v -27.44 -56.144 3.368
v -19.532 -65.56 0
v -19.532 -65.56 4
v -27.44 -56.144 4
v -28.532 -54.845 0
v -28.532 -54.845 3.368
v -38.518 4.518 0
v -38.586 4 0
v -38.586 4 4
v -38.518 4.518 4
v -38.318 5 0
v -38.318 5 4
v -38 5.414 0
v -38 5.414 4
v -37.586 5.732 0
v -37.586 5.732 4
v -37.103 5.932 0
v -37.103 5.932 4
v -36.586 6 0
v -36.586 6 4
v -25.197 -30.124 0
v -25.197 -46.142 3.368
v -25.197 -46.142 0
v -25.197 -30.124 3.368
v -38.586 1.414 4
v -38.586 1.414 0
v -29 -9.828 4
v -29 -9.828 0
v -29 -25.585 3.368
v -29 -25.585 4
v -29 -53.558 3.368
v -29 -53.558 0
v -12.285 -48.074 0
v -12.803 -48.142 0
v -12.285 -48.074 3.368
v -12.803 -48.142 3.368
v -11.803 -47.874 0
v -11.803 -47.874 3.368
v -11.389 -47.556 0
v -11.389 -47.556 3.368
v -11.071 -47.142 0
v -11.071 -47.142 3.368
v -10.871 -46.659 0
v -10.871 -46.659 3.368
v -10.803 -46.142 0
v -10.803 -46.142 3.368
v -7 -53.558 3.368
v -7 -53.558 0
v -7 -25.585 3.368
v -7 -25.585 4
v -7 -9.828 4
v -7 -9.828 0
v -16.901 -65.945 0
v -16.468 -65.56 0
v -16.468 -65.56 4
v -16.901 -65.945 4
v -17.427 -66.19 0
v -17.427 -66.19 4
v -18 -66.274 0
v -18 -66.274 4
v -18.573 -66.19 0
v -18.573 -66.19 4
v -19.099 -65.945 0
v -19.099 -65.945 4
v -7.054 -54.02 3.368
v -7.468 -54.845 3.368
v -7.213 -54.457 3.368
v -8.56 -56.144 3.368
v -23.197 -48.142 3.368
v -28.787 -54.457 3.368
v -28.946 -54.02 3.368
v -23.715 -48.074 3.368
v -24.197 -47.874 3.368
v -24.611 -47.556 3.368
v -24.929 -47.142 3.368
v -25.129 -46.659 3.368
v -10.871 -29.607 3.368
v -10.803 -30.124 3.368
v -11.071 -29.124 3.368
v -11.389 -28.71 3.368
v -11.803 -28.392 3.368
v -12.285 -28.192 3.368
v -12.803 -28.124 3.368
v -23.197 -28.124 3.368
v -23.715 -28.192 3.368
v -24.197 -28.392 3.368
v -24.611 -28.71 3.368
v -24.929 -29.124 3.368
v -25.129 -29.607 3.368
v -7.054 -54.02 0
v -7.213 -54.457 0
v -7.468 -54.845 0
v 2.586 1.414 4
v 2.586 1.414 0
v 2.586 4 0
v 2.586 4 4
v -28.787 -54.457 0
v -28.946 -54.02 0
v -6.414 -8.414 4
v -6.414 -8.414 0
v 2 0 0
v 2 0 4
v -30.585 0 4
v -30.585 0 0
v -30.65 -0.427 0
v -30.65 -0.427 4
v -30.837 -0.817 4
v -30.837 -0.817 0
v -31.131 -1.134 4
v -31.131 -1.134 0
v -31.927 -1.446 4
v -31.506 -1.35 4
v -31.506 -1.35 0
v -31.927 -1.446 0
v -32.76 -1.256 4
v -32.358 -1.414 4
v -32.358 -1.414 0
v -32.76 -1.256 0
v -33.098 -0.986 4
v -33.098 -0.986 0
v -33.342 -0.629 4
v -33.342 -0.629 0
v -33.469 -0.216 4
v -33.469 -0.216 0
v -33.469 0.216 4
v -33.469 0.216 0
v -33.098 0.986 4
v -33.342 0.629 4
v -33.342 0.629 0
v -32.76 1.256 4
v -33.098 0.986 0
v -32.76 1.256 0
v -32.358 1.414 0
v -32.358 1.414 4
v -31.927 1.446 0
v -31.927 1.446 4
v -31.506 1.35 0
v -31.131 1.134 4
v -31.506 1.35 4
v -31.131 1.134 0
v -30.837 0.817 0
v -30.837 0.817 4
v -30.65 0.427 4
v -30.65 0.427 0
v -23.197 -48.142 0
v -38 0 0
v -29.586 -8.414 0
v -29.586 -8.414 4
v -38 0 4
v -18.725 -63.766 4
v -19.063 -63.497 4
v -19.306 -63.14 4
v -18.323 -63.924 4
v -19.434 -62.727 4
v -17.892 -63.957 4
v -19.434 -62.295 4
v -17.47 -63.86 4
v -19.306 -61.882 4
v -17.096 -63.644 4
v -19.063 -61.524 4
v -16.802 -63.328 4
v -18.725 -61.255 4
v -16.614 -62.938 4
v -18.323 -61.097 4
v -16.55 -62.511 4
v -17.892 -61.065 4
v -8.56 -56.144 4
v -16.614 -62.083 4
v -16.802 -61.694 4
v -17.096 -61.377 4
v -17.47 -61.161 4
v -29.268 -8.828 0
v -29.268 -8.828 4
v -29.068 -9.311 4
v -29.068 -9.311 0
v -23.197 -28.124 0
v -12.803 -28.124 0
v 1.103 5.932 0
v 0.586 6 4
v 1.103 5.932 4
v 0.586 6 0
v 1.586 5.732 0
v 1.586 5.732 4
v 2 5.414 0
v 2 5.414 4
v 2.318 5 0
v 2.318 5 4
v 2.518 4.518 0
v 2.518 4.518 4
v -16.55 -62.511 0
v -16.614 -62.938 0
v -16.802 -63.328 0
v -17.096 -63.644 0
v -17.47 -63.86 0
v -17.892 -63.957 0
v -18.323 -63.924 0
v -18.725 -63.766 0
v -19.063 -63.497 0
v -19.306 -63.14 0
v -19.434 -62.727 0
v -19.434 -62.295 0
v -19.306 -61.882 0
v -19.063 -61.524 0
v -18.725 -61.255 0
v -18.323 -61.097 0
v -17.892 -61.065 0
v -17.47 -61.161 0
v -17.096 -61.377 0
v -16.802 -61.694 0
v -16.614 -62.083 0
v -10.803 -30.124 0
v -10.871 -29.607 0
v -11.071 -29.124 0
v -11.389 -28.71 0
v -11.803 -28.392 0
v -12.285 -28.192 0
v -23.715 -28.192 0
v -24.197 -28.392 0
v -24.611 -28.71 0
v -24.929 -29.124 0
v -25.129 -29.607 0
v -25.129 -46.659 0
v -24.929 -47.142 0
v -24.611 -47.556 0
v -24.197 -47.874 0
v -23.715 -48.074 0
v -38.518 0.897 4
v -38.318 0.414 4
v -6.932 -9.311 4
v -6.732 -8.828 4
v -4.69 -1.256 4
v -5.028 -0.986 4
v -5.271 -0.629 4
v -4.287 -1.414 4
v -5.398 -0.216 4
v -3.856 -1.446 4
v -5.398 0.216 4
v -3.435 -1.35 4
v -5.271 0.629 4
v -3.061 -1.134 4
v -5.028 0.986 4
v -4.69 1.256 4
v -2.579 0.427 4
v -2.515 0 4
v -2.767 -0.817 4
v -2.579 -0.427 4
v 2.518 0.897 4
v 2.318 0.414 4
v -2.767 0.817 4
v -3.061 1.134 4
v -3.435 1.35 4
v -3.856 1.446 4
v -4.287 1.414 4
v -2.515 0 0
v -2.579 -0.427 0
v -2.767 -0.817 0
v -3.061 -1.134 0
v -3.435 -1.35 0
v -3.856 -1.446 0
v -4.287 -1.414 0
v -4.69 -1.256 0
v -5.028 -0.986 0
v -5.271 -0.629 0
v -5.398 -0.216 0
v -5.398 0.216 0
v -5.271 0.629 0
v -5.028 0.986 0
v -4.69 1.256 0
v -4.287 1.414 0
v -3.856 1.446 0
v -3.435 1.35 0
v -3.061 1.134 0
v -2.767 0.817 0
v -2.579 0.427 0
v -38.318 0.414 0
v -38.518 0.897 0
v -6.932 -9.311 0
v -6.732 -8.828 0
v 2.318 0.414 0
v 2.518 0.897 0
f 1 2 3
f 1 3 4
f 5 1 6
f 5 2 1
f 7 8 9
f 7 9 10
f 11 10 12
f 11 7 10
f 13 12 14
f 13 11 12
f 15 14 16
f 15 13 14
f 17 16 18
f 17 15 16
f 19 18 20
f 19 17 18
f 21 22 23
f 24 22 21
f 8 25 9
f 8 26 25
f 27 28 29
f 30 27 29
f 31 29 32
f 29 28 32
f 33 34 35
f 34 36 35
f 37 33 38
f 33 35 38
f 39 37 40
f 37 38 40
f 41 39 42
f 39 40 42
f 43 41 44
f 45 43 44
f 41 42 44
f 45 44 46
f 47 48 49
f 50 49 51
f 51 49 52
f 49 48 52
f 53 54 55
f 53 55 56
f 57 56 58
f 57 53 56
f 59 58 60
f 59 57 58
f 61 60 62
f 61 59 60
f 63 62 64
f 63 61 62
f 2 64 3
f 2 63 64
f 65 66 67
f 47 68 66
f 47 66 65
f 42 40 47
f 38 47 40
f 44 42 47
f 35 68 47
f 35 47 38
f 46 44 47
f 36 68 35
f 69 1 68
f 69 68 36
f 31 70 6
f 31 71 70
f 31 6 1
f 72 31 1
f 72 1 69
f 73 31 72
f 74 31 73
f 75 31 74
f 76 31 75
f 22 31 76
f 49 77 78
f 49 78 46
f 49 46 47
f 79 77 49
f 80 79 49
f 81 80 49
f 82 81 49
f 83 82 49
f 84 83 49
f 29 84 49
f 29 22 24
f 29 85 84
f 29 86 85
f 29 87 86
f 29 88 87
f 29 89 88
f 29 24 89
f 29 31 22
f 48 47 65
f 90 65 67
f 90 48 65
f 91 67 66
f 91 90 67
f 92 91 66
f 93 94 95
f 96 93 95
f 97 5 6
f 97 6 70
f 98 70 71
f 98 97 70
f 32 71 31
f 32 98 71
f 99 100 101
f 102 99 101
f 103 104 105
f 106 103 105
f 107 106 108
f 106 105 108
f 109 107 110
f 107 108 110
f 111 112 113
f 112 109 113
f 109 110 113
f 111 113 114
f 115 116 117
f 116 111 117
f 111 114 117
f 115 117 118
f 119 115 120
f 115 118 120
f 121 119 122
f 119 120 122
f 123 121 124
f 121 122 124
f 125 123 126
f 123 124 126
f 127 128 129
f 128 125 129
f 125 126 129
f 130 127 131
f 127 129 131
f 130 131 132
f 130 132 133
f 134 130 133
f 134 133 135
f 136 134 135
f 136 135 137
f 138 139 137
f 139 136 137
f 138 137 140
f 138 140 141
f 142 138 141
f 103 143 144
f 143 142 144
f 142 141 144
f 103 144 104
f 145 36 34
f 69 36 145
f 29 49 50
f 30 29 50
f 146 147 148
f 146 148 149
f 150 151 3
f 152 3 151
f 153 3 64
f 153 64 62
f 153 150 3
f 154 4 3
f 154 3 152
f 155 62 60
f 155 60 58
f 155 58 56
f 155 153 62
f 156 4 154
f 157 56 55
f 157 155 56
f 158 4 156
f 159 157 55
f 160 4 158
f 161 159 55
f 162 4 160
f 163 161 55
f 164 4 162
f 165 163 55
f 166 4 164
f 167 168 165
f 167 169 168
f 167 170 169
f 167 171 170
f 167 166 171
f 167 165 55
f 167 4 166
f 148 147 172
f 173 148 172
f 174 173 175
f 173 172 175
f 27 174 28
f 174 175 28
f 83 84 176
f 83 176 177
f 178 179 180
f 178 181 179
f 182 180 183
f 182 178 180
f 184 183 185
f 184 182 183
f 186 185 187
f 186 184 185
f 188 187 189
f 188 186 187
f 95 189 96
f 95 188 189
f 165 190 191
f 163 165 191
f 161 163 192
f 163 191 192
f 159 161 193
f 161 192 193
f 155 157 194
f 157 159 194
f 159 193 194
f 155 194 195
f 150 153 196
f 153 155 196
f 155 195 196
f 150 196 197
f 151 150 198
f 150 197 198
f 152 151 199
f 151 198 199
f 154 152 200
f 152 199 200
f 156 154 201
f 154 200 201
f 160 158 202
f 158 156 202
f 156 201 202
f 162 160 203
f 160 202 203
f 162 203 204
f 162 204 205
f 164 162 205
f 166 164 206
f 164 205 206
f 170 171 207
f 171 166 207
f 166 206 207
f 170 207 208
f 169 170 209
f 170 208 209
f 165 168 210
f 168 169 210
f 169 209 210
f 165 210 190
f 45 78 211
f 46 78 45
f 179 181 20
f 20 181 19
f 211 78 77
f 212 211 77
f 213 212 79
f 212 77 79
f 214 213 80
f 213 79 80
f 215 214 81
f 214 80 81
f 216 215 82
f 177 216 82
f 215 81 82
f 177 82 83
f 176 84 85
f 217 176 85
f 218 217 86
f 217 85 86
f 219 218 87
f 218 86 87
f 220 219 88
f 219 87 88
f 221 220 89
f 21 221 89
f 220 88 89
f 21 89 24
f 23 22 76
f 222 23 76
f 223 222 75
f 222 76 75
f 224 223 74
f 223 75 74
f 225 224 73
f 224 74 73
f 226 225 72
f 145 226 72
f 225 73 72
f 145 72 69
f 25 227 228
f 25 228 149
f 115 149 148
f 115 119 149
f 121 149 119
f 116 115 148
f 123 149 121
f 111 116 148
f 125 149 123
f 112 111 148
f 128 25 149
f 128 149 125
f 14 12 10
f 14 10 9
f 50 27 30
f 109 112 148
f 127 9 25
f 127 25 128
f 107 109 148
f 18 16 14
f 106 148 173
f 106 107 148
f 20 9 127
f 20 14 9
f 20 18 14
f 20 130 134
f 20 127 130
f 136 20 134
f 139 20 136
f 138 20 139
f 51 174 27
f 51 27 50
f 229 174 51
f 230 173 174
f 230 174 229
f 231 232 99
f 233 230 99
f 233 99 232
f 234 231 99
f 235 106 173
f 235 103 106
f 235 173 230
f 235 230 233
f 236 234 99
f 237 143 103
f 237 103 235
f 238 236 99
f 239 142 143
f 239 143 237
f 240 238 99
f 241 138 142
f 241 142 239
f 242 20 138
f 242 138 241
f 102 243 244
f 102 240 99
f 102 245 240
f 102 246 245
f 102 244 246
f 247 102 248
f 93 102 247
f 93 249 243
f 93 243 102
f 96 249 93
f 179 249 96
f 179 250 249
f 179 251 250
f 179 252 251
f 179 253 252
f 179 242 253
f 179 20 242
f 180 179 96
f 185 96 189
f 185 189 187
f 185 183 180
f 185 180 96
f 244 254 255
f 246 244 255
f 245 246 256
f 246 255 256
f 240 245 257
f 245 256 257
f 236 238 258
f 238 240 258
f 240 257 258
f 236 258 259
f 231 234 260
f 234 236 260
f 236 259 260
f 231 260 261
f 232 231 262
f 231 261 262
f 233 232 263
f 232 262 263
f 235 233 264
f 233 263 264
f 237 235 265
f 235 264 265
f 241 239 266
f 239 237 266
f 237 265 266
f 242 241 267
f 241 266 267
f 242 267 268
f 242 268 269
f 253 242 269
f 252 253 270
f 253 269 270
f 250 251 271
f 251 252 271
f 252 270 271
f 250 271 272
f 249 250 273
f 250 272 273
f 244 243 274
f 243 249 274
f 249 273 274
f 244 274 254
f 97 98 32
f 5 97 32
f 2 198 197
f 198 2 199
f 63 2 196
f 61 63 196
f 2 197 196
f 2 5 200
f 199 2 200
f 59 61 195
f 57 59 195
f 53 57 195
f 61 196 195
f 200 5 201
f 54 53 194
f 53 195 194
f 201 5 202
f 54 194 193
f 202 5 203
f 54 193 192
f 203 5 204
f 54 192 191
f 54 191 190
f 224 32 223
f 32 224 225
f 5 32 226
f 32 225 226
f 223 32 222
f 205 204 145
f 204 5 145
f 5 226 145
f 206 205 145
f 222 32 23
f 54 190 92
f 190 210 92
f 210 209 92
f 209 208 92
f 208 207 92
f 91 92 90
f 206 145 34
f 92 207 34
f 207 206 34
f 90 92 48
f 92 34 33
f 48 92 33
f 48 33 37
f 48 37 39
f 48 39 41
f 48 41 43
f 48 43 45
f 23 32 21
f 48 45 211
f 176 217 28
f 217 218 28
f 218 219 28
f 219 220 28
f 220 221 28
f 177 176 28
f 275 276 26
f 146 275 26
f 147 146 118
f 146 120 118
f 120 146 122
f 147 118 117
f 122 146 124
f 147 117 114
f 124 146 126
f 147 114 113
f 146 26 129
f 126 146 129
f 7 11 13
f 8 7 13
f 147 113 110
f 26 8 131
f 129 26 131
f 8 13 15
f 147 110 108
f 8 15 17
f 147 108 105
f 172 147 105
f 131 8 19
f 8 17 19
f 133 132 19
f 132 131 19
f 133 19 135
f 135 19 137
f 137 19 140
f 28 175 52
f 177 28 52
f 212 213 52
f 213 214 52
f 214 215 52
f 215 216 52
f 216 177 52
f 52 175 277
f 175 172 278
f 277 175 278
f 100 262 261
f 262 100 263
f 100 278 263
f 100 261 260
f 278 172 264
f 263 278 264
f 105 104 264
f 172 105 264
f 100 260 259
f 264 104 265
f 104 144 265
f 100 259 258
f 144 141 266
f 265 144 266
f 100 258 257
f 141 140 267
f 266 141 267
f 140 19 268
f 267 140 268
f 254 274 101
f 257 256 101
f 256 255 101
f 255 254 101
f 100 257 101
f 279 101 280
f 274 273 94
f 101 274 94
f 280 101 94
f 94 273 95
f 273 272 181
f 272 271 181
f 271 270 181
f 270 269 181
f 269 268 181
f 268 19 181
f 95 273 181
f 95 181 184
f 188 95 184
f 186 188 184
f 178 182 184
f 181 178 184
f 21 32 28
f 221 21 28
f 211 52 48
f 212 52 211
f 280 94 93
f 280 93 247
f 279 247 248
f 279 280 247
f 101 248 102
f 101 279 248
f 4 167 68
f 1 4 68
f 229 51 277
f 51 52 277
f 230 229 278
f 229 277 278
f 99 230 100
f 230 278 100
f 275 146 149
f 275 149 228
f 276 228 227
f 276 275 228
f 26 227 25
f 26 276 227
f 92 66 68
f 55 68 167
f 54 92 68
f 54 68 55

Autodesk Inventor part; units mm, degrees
ref_plane "YZ Plane" through (0, 0, 0) normal (1, 0, 0) x (0, 1, 0)
ref_plane "XZ Plane" through (0, 0, 0) normal (0, 1, 0) x (-1, 0, 0)
ref_plane "XY Plane" through (0, 0, 0) normal (0, 0, 1) x (1, 0, 0)
ref_plane "Work Plane1" through (0, 0, 0) normal (0, 0, 1) x (1, 0, 0)
sketch "Sketch1" plane through (0, 0, 0) normal (0, 0, 1) x (1, 0, 0)
  circle A0 centre (-18, 0) radius 2.45 construction
  circle A1 centre (-32.0354, 0) radius 2.45 construction
  circle A2 centre (-48, 0) radius 3.05 construction
  line L0 (18, 6) -> (-54, 6) construction
  line L1 (-54, -6) -> (-54, 6) construction
  line L2 (-54, -6) -> (18, -6) construction
  line L3 (18, -6) -> (18, 6) construction
  circle A3 centre (12, 0) radius 3.05 construction
  circle A4 centre (-3.9646, 0) radius 2.45 construction
  circle A5 centre (-18, -62.5107) radius 2.45 construction
  circle A6 centre (-3.9646, -62.1646) radius 2.45 construction
  circle A7 centre (12, -70) radius 3.05 construction
  line L4 (-32.0354, -67.7344) -> (-3.9646, -67.7344) construction
  line L5 (-3.9646, -67.7344) -> (14.2856, -76.6915) construction
  line L6 (14.2856, -76.6915) -> (18.6915, -67.7144) construction
  line L7 (18.6915, -67.7144) -> (-2.5545, -57.2869) construction
  line L8 (-33.4455, -57.2869) -> (-2.5545, -57.2869) construction
  line L9 (-54.6915, -67.7144) -> (-33.4455, -57.2869) construction
  line L10 (-50.2856, -76.6915) -> (-54.6915, -67.7144) construction
  line L11 (-32.0354, -67.7344) -> (-50.2856, -76.6915) construction
  circle A8 centre (-48, -70) radius 3.05 construction
  circle A9 centre (-32.0354, -62.1646) radius 2.45 construction
  line L12 (-30, -24.7225) -> (-6, -24.7225) construction
  line L13 (-6, -24.7225) -> (-6, -18.4525) construction
  line L14 (-6, -18.4525) -> (-30, -18.4525) construction
  line L15 (-30, -18.4525) -> (-30, -24.7225) construction
  line L16 (-6, -33.7225) -> (-11.7463, -33.7225) construction
  line L17 (-6, -33.34) -> (-6, -33.7225) construction
  line L18 (-6, -33.34) -> (-11.7042, -33.34) construction
  line L19 (-6, -32.95) -> (-6, -33.34) construction
  line L20 (-6, -32.95) -> (-11.6853, -32.95) construction
  line L21 (-6, -32.56) -> (-6, -32.95) construction
  line L22 (-6, -32.56) -> (-11.6906, -32.56) construction
  line L23 (-6, -32.17) -> (-6, -32.56) construction
  line L24 (-6, -32.17) -> (-11.72, -32.17) construction
  line L25 (-6, -31.78) -> (-6, -32.17) construction
  line L26 (-6, -31.78) -> (-11.7739, -31.78) construction
  line L27 (-6, -31.39) -> (-6, -31.78) construction
  line L28 (-6, -31.39) -> (-11.8531, -31.39) construction
  line L29 (-6, -31) -> (-6, -31.39) construction
  line L30 (-6, -31) -> (-11.9583, -31) construction
  line L31 (-6, -30.61) -> (-6, -31) construction
  line L32 (-6, -30.61) -> (-12.0912, -30.61) construction
  line L33 (-6, -30.22) -> (-6, -30.61) construction
  line L34 (-6, -30.22) -> (-12.2534, -30.22) construction
  line L35 (-6, -29.83) -> (-6, -30.22) construction
  line L36 (-6, -29.83) -> (-12.4478, -29.83) construction
  line L37 (-6, -29.44) -> (-6, -29.83) construction
  line L38 (-6, -29.44) -> (-12.6777, -29.44) construction
  line L39 (-6, -29.05) -> (-6, -29.44) construction
  line L40 (-6, -29.05) -> (-12.948, -29.05) construction
  line L41 (-6, -28.66) -> (-6, -29.05) construction
  line L42 (-6, -28.66) -> (-13.2656, -28.66) construction
  line L43 (-6, -24.7225) -> (-6, -28.66) construction
  line L44 (-30, -24.7225) -> (-6, -24.7225) construction
  line L45 (-30, -28.66) -> (-30, -24.7225) construction
  line L46 (-22.7344, -28.66) -> (-30, -28.66) construction
  line L47 (-30, -29.05) -> (-30, -28.66) construction
  line L48 (-23.052, -29.05) -> (-30, -29.05) construction
  line L49 (-30, -29.44) -> (-30, -29.05) construction
  line L50 (-23.3223, -29.44) -> (-30, -29.44) construction
  line L51 (-30, -29.83) -> (-30, -29.44) construction
  line L52 (-23.5522, -29.83) -> (-30, -29.83) construction
  line L53 (-30, -30.22) -> (-30, -29.83) construction
  line L54 (-23.7466, -30.22) -> (-30, -30.22) construction
  line L55 (-30, -30.61) -> (-30, -30.22) construction
  line L56 (-23.9088, -30.61) -> (-30, -30.61) construction
  line L57 (-30, -31) -> (-30, -30.61) construction
  line L58 (-24.0417, -31) -> (-30, -31) construction
  line L59 (-30, -31.39) -> (-30, -31) construction
  line L60 (-24.1469, -31.39) -> (-30, -31.39) construction
  line L61 (-30, -31.78) -> (-30, -31.39) construction
  line L62 (-24.2261, -31.78) -> (-30, -31.78) construction
  line L63 (-30, -32.17) -> (-30, -31.78) construction
  line L64 (-24.28, -32.17) -> (-30, -32.17) construction
  line L65 (-30, -32.56) -> (-30, -32.17) construction
  line L66 (-24.3094, -32.56) -> (-30, -32.56) construction
  line L67 (-30, -32.95) -> (-30, -32.56) construction
  line L68 (-24.3147, -32.95) -> (-30, -32.95) construction
  line L69 (-30, -33.34) -> (-30, -32.95) construction
  line L70 (-24.2958, -33.34) -> (-30, -33.34) construction
  line L71 (-30, -33.7225) -> (-30, -33.34) construction
  line L72 (-24.2537, -33.7225) -> (-30, -33.7225) construction
  line L73 (-7.4129, -57.0165) -> (-7.4129, -24.5897) construction
  line L74 (-21.9151, -37.7958) -> (-30, -37.7958) construction
  line L75 (-30, -37.7958) -> (-30, -44.4525) construction
  line L76 (-30, -44.4525) -> (-6, -44.4525) construction
  line L77 (-6, -44.4525) -> (-6, -37.7958) construction
  line L78 (-6, -37.7958) -> (-14.0849, -37.7958) construction
  line L79 (-29, -9.8284) -> (-29, -53.5585)
  line L80 (-7, -53.5585) -> (-7, -9.8284)
  line L81 (-7.4685, -54.8448) -> (-16.4685, -65.5601)
  line L82 (-19.5315, -65.5601) -> (-28.5315, -54.8448)
  line L83 (-6.4142, -8.4142) -> (2, 0)
  line L84 (-7, -9) -> (4.8995, -9) construction
  line L85 (2.5858, 1.4142) -> (2.5858, 4)
  line L86 (-29.5858, -8.4142) -> (-38, 0)
  line L87 (-29, -9) -> (-17.1005, -9) construction
  line L88 (-38.5858, 1.4142) -> (-38.5858, 4)
  line L89 (0.5858, 6) -> (-36.5858, 6)
  circle A10 centre (-3.9646, 0) radius 1.45
  circle A11 centre (-32.0354, 0) radius 1.45
  circle A12 centre (-18, -62.5107) radius 1.45
  arc A13 (-19.5315, -65.5601) -> (-16.4685, -65.5601) centre (-18, -64.2738) ccw
  arc A14 (-7.4685, -54.8448) -> (-7, -53.5585) centre (-9, -53.5585) ccw
  arc A15 (-29, -53.5585) -> (-28.5315, -54.8448) centre (-27, -53.5585) ccw
  arc A16 (-6.4142, -8.4142) -> (-7, -9.8284) centre (-5, -9.8284) ccw
  arc A17 (-29, -9.8284) -> (-29.5858, -8.4142) centre (-31, -9.8284) ccw
  arc A18 (-36.5858, 6) -> (-38.5858, 4) centre (-36.5858, 4) ccw
  arc A19 (2.5858, 4) -> (0.5858, 6) centre (0.5858, 4) ccw
  arc A20 (2, 0) -> (2.5858, 1.4142) centre (0.5858, 1.4142) ccw
  arc A21 (-38.5858, 1.4142) -> (-38, 0) centre (-36.5858, 1.4142) ccw
  arc A22 (-21.9151, -37.7958) -> (-14.0849, -37.7958) centre (-18, -32.8401) ccw projected
  arc A23 (-24.2537, -33.7225) -> (-11.7463, -33.7225) centre (-18, -32.8401) ccw projected
  point P0 (0, 0)
  point P1 (2.5858, 6)
  point P2 (-38.5858, 6)
  dimension "d0" = 1
  dimension "d1" = 1
  dimension "d4" = 45
  dimension "d5" = 135
  dimension "d6" = 2.9
  dimension "d7" = 2.9
  dimension "d8" = 2.9
  dimension "d9" = 2
extrude "Extrusion1" add sketch "Sketch1" along normal blind 4
sketch "Sketch2" plane through (-29, -53.5585, 0) normal (-1, 0, 0) x (0, 0, 1)
  line L0 (-1.5567, 7.7184) -> (-1.5567, 33.7184) projected
  line L1 (4.4433, 27.7184) -> (4.4433, 13.7184) projected
  line L2 (-41.5567, 33.7184) -> (-41.5567, 7.7184) projected
  line L3 (10.4433, 9.1059) -> (10.4433, 35.1059) projected
  line L4 (10.6133, 9.1059) -> (10.6133, 15.7626) projected
  line L5 (4.3679, 25.1128) -> (4.3679, 21.8128) projected
  line L6 (4.3679, 15.0628) -> (4.3679, -1.8872) projected
  line L7 (3.3679, 25.1128) -> (4.3679, 25.1128) projected
  line L8 (3.3679, -1.8872) -> (4.3679, -1.8872) projected
  line L9 (5.9789, -2.5856) -> (3.3679, -2.5856)
  line L10 (3.3679, -2.5856) -> (3.3679, 27.9738)
  line L11 (3.3679, 27.9738) -> (5.9789, 27.9738)
  line L12 (5.9789, 27.9738) -> (5.9789, -2.5856)
  point P0 (0, 53.5585)
extrude "Extrusion2" cut sketch "Sketch2" against normal through all
sketch "Sketch3" plane through (-29, -44.6525, 4) normal (0, 0, 1) x (1, 0, 0)
  line L0 (0, 19.0679) -> (22, 19.0679) projected
  line L1 (0.4269, -10.7931) -> (24.1869, -10.7931) projected
  line L2 (5.8029, 16.5283) -> (16.1971, 16.5283)
  line L3 (18.1971, 14.5283) -> (18.1971, -1.4892)
  line L4 (16.1971, -3.4892) -> (5.8029, -3.4892)
  line L5 (3.8029, -1.4892) -> (3.8029, 14.5283)
  line L6 (3.8029, 16.5283) -> (18.1971, -3.4892) construction
  line L7 (18.1971, 16.5283) -> (3.8029, -3.4892) construction
  arc A0 (5.8029, 16.5283) -> (3.8029, 14.5283) centre (5.8029, 14.5283) ccw
  arc A1 (18.1971, 14.5283) -> (16.1971, 16.5283) centre (16.1971, 14.5283) ccw
  arc A2 (16.1971, -3.4892) -> (18.1971, -1.4892) centre (16.1971, -1.4892) ccw
  arc A3 (3.8029, -1.4892) -> (5.8029, -3.4892) centre (5.8029, -1.4892) ccw
  point P0 (11, 6.5196)
  dimension "d30" = 2
extrude "Extrusion3" cut sketch "Sketch3" against normal through all
chamfer "Chamfer1" [suppressed]
ref_plane "Work Plane2" through (-36.5858, -16, 0) normal (0, 1, 0) x (1, 0, 0)
properties part number "cellSTORM_inverted_chiptray_v0"
